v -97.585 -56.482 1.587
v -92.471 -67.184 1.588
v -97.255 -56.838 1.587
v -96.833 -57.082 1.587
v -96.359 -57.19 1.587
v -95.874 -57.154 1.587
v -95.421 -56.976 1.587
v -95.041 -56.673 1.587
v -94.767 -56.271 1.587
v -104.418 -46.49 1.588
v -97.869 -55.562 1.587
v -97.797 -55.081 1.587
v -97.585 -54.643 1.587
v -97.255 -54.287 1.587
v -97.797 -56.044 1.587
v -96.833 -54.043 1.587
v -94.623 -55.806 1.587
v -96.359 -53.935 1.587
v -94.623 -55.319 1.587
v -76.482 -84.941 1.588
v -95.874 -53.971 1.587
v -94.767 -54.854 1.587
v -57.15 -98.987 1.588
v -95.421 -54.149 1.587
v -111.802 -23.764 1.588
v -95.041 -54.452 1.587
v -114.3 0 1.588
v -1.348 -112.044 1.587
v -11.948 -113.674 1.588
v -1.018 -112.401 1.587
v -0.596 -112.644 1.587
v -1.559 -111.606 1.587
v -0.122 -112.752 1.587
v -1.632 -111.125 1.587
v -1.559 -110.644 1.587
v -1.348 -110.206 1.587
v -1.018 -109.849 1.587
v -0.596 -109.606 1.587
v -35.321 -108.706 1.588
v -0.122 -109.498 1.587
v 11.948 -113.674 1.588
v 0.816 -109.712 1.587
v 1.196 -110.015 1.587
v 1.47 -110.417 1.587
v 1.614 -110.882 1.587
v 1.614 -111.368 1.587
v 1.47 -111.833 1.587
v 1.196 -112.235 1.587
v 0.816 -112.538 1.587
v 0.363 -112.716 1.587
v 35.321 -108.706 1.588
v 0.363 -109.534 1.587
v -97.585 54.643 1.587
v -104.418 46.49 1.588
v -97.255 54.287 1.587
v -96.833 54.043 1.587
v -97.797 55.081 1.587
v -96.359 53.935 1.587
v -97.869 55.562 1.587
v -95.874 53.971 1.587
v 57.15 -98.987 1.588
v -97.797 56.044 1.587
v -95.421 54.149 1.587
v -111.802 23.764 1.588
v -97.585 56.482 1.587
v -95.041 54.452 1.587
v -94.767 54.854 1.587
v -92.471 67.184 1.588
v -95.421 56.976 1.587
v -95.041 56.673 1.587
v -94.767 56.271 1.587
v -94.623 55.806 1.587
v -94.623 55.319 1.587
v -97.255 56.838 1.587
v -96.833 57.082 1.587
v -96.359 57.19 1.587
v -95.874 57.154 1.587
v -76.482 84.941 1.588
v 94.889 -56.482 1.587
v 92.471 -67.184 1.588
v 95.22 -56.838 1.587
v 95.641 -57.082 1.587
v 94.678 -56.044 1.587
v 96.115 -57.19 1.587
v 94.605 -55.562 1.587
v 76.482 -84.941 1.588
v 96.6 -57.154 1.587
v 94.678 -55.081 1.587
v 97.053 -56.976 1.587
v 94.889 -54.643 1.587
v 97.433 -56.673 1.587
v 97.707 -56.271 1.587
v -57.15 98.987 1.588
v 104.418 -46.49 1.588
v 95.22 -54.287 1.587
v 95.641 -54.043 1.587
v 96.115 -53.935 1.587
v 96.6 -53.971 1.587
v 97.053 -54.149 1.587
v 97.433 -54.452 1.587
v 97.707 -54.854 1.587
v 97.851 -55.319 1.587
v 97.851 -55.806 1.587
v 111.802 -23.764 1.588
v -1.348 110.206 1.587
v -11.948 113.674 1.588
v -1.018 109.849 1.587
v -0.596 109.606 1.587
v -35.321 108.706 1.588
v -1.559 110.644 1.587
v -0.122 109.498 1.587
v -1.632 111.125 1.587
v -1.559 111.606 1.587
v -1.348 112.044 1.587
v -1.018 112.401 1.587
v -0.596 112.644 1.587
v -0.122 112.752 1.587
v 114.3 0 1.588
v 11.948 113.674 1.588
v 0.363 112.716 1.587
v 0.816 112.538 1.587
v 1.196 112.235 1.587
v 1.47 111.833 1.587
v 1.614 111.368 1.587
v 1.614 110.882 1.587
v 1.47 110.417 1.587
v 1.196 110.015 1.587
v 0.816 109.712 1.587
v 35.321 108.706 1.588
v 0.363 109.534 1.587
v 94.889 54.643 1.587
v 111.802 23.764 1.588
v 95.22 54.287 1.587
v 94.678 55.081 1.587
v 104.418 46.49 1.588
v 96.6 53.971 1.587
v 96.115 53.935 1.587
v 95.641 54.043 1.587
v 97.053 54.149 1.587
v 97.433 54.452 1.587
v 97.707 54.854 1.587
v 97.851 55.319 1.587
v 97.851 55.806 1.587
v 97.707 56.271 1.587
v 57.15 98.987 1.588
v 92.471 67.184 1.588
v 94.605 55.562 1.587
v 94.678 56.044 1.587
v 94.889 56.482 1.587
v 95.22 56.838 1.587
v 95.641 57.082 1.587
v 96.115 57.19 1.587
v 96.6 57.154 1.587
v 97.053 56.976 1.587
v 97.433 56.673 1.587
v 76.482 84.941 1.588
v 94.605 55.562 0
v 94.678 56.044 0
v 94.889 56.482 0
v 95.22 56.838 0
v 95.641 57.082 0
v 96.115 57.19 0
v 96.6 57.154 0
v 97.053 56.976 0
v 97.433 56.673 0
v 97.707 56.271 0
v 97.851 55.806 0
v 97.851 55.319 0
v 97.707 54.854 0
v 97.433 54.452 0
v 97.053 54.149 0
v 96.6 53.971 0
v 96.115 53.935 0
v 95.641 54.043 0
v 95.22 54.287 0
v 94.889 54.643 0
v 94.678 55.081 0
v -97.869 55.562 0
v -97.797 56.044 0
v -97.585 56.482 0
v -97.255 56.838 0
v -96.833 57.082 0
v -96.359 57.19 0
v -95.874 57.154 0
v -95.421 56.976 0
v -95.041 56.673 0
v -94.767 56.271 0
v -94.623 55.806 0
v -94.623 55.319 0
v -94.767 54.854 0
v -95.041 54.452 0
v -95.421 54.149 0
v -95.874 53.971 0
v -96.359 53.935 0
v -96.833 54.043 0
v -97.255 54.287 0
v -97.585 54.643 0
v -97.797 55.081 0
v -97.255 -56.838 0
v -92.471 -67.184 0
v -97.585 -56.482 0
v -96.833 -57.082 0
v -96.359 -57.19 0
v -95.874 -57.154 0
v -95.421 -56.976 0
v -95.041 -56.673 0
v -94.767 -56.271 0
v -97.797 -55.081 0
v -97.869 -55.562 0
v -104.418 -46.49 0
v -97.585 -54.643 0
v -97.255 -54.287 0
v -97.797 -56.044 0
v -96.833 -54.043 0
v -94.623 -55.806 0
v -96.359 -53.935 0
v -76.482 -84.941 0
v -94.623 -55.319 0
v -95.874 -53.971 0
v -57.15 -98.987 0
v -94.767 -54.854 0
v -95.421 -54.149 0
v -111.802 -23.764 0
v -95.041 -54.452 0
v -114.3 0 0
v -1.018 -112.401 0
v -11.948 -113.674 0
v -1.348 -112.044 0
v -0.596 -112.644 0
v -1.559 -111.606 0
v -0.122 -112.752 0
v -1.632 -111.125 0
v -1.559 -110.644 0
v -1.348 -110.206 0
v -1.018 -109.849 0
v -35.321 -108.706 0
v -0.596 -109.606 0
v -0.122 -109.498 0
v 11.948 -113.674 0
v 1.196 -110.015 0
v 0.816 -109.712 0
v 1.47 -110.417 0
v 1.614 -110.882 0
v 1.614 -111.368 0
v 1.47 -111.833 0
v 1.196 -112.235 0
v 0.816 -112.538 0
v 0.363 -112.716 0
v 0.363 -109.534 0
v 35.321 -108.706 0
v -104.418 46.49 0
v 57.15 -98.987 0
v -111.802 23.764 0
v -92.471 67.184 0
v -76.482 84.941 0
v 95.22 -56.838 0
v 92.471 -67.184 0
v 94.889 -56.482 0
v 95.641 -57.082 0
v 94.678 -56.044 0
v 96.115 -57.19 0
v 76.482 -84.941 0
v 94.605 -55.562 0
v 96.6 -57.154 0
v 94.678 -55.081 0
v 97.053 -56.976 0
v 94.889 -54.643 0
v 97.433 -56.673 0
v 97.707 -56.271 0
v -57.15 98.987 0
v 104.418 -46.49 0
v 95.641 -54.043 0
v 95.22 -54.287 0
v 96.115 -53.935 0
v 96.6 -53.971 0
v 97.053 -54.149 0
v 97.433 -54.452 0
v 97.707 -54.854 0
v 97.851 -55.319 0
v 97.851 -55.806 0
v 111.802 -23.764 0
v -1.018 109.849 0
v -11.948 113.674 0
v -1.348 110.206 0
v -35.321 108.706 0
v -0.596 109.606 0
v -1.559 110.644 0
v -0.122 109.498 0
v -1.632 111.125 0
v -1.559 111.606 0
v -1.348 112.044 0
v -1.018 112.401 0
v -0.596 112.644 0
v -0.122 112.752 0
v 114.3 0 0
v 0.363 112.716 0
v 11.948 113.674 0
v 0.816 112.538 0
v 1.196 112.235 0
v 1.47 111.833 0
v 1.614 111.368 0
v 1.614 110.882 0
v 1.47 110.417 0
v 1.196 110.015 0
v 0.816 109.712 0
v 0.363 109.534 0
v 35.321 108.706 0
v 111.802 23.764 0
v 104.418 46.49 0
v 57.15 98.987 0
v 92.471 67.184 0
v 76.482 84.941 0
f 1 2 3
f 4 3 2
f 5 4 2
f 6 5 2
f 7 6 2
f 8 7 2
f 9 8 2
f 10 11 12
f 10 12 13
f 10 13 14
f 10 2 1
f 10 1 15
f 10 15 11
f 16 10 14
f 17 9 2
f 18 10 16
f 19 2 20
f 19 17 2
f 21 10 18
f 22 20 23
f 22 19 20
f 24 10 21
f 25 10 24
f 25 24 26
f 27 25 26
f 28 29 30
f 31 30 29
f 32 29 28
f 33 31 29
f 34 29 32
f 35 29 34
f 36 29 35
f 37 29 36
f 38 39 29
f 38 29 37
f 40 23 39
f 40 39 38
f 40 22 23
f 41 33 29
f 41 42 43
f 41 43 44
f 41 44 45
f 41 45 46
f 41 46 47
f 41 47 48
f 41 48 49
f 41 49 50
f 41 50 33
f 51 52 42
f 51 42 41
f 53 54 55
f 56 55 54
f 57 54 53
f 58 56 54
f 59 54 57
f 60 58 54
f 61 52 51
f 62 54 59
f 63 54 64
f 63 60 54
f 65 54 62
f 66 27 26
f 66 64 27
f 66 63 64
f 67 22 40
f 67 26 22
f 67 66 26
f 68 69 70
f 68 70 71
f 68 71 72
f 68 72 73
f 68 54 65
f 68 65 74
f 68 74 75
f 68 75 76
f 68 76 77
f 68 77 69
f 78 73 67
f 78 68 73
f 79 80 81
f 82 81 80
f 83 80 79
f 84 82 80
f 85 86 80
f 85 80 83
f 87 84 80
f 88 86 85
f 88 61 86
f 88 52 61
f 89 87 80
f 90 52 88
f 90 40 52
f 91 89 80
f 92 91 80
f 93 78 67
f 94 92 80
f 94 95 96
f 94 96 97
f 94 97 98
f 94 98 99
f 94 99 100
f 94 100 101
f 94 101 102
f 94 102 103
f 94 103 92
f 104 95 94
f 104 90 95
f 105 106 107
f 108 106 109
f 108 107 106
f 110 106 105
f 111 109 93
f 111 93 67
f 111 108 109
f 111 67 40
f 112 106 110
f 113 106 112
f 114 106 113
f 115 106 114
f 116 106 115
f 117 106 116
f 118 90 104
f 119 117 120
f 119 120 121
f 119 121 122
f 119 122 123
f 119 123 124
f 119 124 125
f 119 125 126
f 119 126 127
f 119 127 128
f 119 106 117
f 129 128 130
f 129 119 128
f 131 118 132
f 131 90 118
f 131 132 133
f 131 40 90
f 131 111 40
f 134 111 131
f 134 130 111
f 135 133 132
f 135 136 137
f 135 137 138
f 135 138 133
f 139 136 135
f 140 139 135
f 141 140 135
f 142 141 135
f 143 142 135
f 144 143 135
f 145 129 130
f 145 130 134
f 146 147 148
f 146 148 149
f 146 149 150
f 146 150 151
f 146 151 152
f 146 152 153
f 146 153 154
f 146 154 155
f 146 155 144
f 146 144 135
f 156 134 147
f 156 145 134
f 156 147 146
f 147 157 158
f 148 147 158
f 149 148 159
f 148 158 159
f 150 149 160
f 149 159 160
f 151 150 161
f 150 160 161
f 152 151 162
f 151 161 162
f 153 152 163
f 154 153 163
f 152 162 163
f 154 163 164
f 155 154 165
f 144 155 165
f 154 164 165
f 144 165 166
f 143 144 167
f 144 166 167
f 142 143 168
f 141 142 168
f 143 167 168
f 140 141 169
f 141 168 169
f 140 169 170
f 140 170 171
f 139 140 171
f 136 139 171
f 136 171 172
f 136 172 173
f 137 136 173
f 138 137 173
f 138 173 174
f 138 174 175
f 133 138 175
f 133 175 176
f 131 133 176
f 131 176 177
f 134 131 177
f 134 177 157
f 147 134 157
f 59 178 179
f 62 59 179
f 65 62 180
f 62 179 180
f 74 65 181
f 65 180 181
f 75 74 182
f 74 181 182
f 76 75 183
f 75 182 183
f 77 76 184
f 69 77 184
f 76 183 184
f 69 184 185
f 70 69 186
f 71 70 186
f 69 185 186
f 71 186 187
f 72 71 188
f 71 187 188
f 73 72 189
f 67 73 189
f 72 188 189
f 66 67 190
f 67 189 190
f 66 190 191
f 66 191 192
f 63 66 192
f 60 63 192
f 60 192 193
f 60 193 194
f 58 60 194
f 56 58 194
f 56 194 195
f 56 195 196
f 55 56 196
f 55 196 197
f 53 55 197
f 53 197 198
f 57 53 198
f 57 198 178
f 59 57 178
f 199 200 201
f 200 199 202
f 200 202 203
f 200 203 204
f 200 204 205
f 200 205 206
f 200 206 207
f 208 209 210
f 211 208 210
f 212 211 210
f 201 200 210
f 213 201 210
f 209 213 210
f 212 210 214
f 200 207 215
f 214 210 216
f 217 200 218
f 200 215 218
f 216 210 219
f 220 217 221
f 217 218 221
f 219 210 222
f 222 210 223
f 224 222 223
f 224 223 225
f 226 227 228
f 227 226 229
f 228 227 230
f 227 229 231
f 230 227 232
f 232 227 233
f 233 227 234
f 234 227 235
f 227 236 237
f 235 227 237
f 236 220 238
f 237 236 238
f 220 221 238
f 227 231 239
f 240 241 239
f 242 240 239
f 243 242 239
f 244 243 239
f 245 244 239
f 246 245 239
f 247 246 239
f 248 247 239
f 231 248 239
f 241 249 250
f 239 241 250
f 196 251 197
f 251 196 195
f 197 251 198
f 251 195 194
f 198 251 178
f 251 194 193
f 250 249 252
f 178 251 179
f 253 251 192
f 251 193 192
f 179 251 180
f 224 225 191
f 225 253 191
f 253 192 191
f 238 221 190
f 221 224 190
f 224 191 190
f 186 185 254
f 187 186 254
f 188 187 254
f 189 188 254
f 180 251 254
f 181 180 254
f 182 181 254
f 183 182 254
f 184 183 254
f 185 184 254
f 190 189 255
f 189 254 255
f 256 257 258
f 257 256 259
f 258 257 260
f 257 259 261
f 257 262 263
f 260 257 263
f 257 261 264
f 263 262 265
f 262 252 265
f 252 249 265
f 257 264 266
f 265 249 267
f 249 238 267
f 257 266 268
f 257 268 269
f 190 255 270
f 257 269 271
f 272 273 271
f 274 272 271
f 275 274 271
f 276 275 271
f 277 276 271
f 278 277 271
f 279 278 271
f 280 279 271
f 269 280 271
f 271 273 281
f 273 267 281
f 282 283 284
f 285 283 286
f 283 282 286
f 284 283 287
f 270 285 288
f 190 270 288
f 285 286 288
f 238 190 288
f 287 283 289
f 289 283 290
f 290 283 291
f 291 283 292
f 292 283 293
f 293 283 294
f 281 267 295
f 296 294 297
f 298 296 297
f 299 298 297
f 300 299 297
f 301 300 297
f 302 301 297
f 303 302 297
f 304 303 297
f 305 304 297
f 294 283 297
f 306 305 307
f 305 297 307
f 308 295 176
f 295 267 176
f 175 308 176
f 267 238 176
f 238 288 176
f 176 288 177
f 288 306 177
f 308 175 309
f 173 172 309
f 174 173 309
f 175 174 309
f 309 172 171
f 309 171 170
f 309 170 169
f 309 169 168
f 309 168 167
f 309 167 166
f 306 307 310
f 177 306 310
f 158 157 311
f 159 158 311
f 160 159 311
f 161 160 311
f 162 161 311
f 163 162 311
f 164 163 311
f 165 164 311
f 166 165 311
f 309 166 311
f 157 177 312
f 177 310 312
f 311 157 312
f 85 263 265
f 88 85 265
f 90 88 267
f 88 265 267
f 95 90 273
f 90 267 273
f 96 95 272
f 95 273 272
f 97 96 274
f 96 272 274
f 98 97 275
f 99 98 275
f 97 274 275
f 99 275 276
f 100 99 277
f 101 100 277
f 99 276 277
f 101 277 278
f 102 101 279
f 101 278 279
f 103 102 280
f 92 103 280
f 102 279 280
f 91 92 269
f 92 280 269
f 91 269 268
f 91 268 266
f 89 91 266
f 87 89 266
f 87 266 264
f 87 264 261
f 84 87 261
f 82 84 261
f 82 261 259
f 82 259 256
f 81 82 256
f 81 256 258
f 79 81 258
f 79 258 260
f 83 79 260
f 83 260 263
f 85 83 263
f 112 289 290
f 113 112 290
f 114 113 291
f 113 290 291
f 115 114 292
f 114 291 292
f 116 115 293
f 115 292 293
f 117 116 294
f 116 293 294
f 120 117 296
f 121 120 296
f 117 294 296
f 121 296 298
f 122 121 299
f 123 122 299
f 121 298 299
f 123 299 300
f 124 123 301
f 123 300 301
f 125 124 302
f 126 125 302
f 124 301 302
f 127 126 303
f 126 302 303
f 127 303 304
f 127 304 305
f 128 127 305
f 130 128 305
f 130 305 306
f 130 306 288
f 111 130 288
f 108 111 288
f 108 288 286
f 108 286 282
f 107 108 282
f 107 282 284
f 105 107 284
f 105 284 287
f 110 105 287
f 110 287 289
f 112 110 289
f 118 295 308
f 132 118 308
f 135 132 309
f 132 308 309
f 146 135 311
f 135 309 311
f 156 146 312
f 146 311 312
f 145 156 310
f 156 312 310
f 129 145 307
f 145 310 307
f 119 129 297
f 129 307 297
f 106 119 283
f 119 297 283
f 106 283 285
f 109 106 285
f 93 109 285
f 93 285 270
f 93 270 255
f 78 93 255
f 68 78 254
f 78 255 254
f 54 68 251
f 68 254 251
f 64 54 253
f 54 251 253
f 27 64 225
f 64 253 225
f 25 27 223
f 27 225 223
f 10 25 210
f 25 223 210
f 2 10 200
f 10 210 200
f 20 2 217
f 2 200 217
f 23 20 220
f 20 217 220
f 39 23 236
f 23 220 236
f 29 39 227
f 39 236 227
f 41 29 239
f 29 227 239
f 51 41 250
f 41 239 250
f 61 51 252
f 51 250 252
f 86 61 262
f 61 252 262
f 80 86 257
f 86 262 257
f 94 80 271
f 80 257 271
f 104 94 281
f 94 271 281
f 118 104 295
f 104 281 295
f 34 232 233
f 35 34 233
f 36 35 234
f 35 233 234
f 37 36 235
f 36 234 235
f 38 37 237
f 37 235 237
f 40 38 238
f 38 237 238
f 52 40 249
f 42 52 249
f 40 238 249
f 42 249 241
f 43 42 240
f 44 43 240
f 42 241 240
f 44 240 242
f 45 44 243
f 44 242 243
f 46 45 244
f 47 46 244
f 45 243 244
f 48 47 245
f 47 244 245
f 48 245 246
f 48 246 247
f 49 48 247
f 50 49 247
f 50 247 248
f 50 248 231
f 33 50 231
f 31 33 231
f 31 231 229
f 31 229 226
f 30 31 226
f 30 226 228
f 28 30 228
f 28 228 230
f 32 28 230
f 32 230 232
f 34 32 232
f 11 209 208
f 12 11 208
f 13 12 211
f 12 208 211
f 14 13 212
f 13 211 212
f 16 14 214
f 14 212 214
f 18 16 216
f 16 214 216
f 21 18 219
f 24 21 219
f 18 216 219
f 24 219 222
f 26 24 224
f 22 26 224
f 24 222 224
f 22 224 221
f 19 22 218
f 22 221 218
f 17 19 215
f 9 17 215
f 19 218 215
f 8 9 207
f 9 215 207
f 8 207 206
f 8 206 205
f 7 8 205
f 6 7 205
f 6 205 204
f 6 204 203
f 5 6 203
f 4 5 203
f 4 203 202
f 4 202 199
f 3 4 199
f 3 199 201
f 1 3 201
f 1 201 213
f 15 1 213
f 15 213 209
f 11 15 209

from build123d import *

# Parameters (mm, degrees)
SKETCH1_R             = 114.3
BOSS_EXTRUDE1_DEPTH   = 1.5875
F_4_CLEARANCE_HOLE1_D = 3.2639


with BuildPart() as part:
    # Sketch1 → Boss-Extrude1 (new body)
    with BuildSketch(Plane.XY):
        Circle(SKETCH1_R)
    extrude(amount=BOSS_EXTRUDE1_DEPTH)

    # #4 Clearance Hole1 (through all)
    with Locations(Plane(origin=(0, 111.125, 1.5875), x_dir=(1, 0, 0), z_dir=(0, 0, 1))):
        with Locations((0, 0), (96.237072996, -55.5625), (96.237072996, -166.6875), (0, -222.25), (-96.237072996, -166.6875), (-96.237072996, -55.5625)):
            Hole(F_4_CLEARANCE_HOLE1_D / 2)


solid = part.part
